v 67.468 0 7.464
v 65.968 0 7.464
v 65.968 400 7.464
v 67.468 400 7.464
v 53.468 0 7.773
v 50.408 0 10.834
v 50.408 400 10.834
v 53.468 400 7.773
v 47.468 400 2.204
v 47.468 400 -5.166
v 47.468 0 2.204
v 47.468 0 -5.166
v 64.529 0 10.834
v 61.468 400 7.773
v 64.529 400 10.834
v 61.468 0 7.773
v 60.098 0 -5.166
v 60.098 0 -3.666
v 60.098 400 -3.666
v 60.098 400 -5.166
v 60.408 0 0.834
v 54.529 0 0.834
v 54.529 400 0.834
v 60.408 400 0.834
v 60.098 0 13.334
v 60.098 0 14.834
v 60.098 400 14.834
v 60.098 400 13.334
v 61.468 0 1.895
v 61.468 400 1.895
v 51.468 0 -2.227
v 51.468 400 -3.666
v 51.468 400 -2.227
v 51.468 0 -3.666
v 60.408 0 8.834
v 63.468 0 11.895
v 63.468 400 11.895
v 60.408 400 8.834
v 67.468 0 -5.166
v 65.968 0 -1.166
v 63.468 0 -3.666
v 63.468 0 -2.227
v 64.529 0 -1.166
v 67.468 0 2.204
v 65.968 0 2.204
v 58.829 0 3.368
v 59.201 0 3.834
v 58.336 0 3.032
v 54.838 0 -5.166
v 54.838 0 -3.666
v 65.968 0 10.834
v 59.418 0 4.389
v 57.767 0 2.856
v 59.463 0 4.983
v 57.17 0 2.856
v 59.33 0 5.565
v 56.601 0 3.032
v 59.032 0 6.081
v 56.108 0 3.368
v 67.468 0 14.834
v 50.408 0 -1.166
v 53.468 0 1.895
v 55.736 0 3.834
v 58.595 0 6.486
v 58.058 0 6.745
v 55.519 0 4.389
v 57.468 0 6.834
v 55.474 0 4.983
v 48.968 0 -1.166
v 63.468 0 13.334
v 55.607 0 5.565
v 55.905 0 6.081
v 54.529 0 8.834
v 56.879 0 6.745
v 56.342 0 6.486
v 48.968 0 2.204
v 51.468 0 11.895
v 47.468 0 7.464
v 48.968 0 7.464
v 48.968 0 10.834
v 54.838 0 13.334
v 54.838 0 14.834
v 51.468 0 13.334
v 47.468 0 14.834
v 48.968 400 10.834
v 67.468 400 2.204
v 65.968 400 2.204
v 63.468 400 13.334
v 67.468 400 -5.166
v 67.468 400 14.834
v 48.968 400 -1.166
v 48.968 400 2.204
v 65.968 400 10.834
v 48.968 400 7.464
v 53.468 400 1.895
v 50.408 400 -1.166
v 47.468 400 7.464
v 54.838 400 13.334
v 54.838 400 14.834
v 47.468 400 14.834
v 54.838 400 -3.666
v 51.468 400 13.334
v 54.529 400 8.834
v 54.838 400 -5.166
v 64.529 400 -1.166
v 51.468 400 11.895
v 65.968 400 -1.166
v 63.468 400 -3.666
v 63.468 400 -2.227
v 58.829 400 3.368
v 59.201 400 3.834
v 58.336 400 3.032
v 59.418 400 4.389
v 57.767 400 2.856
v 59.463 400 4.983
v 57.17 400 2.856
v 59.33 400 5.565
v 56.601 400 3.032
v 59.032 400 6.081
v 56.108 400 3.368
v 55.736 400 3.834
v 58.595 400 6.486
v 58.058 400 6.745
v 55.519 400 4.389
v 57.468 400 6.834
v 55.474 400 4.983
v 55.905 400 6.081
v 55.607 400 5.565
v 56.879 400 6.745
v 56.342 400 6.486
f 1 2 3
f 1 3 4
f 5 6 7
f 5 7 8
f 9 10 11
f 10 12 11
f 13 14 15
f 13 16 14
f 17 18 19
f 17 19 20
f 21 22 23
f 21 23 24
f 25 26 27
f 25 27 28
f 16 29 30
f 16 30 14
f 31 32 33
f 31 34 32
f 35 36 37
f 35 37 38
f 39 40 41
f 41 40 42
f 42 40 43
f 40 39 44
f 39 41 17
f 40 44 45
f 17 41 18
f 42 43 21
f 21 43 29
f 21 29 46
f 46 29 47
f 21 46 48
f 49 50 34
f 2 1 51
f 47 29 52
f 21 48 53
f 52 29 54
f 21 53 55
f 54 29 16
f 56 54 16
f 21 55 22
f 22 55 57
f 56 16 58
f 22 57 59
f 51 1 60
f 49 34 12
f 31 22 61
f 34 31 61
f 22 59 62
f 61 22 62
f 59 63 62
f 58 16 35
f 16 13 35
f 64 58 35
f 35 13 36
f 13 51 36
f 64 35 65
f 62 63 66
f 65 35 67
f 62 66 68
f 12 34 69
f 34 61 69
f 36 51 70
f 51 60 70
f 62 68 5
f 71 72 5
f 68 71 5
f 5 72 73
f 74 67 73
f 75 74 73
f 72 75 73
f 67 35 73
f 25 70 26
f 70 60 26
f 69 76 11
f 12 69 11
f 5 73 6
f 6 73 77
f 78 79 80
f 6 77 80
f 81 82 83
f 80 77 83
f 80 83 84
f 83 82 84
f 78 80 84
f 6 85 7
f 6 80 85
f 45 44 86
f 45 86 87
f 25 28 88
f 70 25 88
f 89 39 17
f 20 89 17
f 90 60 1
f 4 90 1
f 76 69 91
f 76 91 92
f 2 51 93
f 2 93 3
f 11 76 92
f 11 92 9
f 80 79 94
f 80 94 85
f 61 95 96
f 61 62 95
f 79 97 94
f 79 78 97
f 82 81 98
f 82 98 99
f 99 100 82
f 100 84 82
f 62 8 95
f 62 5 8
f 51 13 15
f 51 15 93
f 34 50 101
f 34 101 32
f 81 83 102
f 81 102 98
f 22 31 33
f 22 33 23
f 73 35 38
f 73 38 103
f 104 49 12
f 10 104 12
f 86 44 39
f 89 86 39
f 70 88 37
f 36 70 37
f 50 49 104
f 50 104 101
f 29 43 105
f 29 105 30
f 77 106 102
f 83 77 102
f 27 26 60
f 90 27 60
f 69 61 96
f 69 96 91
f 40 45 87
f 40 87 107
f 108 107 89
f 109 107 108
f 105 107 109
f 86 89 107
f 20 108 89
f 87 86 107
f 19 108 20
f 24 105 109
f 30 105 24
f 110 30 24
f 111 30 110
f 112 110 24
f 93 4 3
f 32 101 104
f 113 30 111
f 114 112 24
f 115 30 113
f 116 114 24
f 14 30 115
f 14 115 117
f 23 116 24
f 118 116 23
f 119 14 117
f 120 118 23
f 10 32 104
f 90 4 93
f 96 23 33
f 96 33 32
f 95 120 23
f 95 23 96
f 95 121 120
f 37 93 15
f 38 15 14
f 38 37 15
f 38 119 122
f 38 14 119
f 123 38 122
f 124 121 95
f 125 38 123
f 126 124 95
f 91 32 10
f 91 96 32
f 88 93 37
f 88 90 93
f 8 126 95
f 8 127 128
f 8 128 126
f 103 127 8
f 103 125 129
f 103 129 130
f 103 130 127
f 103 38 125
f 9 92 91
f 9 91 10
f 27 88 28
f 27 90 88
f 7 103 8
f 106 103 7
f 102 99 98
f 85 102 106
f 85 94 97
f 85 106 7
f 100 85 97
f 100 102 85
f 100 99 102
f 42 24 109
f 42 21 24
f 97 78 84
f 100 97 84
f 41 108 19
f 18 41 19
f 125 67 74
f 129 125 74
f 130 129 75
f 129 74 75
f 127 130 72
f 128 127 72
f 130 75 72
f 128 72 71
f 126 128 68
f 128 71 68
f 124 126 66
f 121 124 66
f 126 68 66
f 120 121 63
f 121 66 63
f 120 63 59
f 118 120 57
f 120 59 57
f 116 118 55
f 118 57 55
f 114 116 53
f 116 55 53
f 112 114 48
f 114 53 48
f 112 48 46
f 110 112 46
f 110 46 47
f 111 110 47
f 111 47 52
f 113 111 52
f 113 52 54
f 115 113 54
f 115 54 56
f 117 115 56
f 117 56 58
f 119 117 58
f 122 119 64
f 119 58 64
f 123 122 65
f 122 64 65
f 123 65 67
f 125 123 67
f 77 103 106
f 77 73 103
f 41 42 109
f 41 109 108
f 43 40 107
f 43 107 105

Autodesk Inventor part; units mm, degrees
ref_plane "YZ Plane" through (0, 0, 0) normal (1, 0, 0) x (0, 1, 0)
ref_plane "XZ Plane" through (0, 0, 0) normal (0, 1, 0) x (-1, 0, 0)
ref_plane "XY Plane" through (0, 0, 0) normal (0, 0, 1) x (1, 0, 0)
sketch "Sketch1" plane through (0, 0, 0) normal (0, 1, 0) x (-1, 0, 0)
  line L0 (-60.4078, 0.8339) -> (-63.4685, -2.2268)
  line L1 (-54.8385, -5.1661) -> (-54.8385, -3.6661)
  line L2 (-67.4685, 14.8339) -> (-67.4685, 7.4639)
  line L3 (-63.4685, 11.8946) -> (-60.4078, 8.8339)
  line L4 (-54.5291, 8.8339) -> (-51.4685, 11.8946)
  line L5 (-50.4078, 10.8339) -> (-53.4685, 7.7732)
  line L6 (-60.0985, 14.8339) -> (-67.4685, 14.8339)
  line L7 (-48.9685, 2.2039) -> (-47.4685, 2.2039)
  line L8 (-64.5291, -1.1661) -> (-61.4685, 1.8946)
  line L9 (-65.9685, 7.4639) -> (-67.4685, 7.4639)
  line L10 (-47.4685, 14.8339) -> (-54.8385, 14.8339)
  line L11 (-51.4685, -2.2268) -> (-54.5291, 0.8339)
  line L12 (-60.0985, 13.3339) -> (-63.4685, 13.3339)
  line L13 (-51.4685, 13.3339) -> (-54.8385, 13.3339)
  line L14 (-60.0985, -3.6661) -> (-60.0985, -5.1661)
  line L15 (-48.9685, 7.4639) -> (-48.9685, 10.8339)
  line L16 (-50.4078, -1.1661) -> (-48.9685, -1.1661)
  line L17 (-65.9685, 2.2039) -> (-65.9685, -1.1661)
  line L18 (-64.5291, 10.8339) -> (-65.9685, 10.8339)
  line L19 (-67.4685, -5.1661) -> (-60.0985, -5.1661)
  line L20 (-54.8385, -3.6661) -> (-51.4685, -3.6661)
  line L21 (-63.4685, -2.2268) -> (-63.4685, -3.6661)
  line L22 (-54.8385, -5.1661) -> (-47.4685, -5.1661)
  line L23 (-60.4078, 8.8339) -> (-54.5291, 8.8339)
  line L24 (-67.4685, 2.2039) -> (-67.4685, -5.1661)
  line L25 (-53.4685, 7.7732) -> (-53.4685, 1.8946)
  line L26 (-61.4685, 1.8946) -> (-61.4685, 7.7732)
  line L27 (-47.4685, -5.1661) -> (-47.4685, 2.2039)
  line L28 (-54.5291, 0.8339) -> (-60.4078, 0.8339)
  line L29 (-54.8385, 13.3339) -> (-54.8385, 14.8339)
  line L30 (-63.4685, 13.3339) -> (-63.4685, 11.8946)
  line L31 (-48.9685, 10.8339) -> (-50.4078, 10.8339)
  line L32 (-48.9685, -1.1661) -> (-48.9685, 2.2039)
  line L33 (-47.4685, 7.4639) -> (-47.4685, 14.8339)
  line L34 (-65.9685, -1.1661) -> (-64.5291, -1.1661)
  line L35 (-65.9685, 10.8339) -> (-65.9685, 7.4639)
  line L36 (-51.4685, -3.6661) -> (-51.4685, -2.2268)
  line L37 (-63.4685, -3.6661) -> (-60.0985, -3.6661)
  line L38 (-60.0985, 14.8339) -> (-60.0985, 13.3339)
  line L39 (-51.4685, 11.8946) -> (-51.4685, 13.3339)
  line L40 (-47.4685, 7.4639) -> (-48.9685, 7.4639)
  line L41 (-53.4685, 1.8946) -> (-50.4078, -1.1661)
  line L42 (-67.4685, 2.2039) -> (-65.9685, 2.2039)
  line L43 (-61.4685, 7.7732) -> (-64.5291, 10.8339)
extrude "Extrusion1" add sketch "Sketch1" along normal blind 400
sketch "Sketch2" plane through (0, 400, 0) normal (0, 1, 0) x (1, 0, 0)
  point P0 (57.4685, -4.8339)
hole "Hole1" at (57.4685, 400, 4.8339) direction (0, -1, 0) diameter 4 depth 400
